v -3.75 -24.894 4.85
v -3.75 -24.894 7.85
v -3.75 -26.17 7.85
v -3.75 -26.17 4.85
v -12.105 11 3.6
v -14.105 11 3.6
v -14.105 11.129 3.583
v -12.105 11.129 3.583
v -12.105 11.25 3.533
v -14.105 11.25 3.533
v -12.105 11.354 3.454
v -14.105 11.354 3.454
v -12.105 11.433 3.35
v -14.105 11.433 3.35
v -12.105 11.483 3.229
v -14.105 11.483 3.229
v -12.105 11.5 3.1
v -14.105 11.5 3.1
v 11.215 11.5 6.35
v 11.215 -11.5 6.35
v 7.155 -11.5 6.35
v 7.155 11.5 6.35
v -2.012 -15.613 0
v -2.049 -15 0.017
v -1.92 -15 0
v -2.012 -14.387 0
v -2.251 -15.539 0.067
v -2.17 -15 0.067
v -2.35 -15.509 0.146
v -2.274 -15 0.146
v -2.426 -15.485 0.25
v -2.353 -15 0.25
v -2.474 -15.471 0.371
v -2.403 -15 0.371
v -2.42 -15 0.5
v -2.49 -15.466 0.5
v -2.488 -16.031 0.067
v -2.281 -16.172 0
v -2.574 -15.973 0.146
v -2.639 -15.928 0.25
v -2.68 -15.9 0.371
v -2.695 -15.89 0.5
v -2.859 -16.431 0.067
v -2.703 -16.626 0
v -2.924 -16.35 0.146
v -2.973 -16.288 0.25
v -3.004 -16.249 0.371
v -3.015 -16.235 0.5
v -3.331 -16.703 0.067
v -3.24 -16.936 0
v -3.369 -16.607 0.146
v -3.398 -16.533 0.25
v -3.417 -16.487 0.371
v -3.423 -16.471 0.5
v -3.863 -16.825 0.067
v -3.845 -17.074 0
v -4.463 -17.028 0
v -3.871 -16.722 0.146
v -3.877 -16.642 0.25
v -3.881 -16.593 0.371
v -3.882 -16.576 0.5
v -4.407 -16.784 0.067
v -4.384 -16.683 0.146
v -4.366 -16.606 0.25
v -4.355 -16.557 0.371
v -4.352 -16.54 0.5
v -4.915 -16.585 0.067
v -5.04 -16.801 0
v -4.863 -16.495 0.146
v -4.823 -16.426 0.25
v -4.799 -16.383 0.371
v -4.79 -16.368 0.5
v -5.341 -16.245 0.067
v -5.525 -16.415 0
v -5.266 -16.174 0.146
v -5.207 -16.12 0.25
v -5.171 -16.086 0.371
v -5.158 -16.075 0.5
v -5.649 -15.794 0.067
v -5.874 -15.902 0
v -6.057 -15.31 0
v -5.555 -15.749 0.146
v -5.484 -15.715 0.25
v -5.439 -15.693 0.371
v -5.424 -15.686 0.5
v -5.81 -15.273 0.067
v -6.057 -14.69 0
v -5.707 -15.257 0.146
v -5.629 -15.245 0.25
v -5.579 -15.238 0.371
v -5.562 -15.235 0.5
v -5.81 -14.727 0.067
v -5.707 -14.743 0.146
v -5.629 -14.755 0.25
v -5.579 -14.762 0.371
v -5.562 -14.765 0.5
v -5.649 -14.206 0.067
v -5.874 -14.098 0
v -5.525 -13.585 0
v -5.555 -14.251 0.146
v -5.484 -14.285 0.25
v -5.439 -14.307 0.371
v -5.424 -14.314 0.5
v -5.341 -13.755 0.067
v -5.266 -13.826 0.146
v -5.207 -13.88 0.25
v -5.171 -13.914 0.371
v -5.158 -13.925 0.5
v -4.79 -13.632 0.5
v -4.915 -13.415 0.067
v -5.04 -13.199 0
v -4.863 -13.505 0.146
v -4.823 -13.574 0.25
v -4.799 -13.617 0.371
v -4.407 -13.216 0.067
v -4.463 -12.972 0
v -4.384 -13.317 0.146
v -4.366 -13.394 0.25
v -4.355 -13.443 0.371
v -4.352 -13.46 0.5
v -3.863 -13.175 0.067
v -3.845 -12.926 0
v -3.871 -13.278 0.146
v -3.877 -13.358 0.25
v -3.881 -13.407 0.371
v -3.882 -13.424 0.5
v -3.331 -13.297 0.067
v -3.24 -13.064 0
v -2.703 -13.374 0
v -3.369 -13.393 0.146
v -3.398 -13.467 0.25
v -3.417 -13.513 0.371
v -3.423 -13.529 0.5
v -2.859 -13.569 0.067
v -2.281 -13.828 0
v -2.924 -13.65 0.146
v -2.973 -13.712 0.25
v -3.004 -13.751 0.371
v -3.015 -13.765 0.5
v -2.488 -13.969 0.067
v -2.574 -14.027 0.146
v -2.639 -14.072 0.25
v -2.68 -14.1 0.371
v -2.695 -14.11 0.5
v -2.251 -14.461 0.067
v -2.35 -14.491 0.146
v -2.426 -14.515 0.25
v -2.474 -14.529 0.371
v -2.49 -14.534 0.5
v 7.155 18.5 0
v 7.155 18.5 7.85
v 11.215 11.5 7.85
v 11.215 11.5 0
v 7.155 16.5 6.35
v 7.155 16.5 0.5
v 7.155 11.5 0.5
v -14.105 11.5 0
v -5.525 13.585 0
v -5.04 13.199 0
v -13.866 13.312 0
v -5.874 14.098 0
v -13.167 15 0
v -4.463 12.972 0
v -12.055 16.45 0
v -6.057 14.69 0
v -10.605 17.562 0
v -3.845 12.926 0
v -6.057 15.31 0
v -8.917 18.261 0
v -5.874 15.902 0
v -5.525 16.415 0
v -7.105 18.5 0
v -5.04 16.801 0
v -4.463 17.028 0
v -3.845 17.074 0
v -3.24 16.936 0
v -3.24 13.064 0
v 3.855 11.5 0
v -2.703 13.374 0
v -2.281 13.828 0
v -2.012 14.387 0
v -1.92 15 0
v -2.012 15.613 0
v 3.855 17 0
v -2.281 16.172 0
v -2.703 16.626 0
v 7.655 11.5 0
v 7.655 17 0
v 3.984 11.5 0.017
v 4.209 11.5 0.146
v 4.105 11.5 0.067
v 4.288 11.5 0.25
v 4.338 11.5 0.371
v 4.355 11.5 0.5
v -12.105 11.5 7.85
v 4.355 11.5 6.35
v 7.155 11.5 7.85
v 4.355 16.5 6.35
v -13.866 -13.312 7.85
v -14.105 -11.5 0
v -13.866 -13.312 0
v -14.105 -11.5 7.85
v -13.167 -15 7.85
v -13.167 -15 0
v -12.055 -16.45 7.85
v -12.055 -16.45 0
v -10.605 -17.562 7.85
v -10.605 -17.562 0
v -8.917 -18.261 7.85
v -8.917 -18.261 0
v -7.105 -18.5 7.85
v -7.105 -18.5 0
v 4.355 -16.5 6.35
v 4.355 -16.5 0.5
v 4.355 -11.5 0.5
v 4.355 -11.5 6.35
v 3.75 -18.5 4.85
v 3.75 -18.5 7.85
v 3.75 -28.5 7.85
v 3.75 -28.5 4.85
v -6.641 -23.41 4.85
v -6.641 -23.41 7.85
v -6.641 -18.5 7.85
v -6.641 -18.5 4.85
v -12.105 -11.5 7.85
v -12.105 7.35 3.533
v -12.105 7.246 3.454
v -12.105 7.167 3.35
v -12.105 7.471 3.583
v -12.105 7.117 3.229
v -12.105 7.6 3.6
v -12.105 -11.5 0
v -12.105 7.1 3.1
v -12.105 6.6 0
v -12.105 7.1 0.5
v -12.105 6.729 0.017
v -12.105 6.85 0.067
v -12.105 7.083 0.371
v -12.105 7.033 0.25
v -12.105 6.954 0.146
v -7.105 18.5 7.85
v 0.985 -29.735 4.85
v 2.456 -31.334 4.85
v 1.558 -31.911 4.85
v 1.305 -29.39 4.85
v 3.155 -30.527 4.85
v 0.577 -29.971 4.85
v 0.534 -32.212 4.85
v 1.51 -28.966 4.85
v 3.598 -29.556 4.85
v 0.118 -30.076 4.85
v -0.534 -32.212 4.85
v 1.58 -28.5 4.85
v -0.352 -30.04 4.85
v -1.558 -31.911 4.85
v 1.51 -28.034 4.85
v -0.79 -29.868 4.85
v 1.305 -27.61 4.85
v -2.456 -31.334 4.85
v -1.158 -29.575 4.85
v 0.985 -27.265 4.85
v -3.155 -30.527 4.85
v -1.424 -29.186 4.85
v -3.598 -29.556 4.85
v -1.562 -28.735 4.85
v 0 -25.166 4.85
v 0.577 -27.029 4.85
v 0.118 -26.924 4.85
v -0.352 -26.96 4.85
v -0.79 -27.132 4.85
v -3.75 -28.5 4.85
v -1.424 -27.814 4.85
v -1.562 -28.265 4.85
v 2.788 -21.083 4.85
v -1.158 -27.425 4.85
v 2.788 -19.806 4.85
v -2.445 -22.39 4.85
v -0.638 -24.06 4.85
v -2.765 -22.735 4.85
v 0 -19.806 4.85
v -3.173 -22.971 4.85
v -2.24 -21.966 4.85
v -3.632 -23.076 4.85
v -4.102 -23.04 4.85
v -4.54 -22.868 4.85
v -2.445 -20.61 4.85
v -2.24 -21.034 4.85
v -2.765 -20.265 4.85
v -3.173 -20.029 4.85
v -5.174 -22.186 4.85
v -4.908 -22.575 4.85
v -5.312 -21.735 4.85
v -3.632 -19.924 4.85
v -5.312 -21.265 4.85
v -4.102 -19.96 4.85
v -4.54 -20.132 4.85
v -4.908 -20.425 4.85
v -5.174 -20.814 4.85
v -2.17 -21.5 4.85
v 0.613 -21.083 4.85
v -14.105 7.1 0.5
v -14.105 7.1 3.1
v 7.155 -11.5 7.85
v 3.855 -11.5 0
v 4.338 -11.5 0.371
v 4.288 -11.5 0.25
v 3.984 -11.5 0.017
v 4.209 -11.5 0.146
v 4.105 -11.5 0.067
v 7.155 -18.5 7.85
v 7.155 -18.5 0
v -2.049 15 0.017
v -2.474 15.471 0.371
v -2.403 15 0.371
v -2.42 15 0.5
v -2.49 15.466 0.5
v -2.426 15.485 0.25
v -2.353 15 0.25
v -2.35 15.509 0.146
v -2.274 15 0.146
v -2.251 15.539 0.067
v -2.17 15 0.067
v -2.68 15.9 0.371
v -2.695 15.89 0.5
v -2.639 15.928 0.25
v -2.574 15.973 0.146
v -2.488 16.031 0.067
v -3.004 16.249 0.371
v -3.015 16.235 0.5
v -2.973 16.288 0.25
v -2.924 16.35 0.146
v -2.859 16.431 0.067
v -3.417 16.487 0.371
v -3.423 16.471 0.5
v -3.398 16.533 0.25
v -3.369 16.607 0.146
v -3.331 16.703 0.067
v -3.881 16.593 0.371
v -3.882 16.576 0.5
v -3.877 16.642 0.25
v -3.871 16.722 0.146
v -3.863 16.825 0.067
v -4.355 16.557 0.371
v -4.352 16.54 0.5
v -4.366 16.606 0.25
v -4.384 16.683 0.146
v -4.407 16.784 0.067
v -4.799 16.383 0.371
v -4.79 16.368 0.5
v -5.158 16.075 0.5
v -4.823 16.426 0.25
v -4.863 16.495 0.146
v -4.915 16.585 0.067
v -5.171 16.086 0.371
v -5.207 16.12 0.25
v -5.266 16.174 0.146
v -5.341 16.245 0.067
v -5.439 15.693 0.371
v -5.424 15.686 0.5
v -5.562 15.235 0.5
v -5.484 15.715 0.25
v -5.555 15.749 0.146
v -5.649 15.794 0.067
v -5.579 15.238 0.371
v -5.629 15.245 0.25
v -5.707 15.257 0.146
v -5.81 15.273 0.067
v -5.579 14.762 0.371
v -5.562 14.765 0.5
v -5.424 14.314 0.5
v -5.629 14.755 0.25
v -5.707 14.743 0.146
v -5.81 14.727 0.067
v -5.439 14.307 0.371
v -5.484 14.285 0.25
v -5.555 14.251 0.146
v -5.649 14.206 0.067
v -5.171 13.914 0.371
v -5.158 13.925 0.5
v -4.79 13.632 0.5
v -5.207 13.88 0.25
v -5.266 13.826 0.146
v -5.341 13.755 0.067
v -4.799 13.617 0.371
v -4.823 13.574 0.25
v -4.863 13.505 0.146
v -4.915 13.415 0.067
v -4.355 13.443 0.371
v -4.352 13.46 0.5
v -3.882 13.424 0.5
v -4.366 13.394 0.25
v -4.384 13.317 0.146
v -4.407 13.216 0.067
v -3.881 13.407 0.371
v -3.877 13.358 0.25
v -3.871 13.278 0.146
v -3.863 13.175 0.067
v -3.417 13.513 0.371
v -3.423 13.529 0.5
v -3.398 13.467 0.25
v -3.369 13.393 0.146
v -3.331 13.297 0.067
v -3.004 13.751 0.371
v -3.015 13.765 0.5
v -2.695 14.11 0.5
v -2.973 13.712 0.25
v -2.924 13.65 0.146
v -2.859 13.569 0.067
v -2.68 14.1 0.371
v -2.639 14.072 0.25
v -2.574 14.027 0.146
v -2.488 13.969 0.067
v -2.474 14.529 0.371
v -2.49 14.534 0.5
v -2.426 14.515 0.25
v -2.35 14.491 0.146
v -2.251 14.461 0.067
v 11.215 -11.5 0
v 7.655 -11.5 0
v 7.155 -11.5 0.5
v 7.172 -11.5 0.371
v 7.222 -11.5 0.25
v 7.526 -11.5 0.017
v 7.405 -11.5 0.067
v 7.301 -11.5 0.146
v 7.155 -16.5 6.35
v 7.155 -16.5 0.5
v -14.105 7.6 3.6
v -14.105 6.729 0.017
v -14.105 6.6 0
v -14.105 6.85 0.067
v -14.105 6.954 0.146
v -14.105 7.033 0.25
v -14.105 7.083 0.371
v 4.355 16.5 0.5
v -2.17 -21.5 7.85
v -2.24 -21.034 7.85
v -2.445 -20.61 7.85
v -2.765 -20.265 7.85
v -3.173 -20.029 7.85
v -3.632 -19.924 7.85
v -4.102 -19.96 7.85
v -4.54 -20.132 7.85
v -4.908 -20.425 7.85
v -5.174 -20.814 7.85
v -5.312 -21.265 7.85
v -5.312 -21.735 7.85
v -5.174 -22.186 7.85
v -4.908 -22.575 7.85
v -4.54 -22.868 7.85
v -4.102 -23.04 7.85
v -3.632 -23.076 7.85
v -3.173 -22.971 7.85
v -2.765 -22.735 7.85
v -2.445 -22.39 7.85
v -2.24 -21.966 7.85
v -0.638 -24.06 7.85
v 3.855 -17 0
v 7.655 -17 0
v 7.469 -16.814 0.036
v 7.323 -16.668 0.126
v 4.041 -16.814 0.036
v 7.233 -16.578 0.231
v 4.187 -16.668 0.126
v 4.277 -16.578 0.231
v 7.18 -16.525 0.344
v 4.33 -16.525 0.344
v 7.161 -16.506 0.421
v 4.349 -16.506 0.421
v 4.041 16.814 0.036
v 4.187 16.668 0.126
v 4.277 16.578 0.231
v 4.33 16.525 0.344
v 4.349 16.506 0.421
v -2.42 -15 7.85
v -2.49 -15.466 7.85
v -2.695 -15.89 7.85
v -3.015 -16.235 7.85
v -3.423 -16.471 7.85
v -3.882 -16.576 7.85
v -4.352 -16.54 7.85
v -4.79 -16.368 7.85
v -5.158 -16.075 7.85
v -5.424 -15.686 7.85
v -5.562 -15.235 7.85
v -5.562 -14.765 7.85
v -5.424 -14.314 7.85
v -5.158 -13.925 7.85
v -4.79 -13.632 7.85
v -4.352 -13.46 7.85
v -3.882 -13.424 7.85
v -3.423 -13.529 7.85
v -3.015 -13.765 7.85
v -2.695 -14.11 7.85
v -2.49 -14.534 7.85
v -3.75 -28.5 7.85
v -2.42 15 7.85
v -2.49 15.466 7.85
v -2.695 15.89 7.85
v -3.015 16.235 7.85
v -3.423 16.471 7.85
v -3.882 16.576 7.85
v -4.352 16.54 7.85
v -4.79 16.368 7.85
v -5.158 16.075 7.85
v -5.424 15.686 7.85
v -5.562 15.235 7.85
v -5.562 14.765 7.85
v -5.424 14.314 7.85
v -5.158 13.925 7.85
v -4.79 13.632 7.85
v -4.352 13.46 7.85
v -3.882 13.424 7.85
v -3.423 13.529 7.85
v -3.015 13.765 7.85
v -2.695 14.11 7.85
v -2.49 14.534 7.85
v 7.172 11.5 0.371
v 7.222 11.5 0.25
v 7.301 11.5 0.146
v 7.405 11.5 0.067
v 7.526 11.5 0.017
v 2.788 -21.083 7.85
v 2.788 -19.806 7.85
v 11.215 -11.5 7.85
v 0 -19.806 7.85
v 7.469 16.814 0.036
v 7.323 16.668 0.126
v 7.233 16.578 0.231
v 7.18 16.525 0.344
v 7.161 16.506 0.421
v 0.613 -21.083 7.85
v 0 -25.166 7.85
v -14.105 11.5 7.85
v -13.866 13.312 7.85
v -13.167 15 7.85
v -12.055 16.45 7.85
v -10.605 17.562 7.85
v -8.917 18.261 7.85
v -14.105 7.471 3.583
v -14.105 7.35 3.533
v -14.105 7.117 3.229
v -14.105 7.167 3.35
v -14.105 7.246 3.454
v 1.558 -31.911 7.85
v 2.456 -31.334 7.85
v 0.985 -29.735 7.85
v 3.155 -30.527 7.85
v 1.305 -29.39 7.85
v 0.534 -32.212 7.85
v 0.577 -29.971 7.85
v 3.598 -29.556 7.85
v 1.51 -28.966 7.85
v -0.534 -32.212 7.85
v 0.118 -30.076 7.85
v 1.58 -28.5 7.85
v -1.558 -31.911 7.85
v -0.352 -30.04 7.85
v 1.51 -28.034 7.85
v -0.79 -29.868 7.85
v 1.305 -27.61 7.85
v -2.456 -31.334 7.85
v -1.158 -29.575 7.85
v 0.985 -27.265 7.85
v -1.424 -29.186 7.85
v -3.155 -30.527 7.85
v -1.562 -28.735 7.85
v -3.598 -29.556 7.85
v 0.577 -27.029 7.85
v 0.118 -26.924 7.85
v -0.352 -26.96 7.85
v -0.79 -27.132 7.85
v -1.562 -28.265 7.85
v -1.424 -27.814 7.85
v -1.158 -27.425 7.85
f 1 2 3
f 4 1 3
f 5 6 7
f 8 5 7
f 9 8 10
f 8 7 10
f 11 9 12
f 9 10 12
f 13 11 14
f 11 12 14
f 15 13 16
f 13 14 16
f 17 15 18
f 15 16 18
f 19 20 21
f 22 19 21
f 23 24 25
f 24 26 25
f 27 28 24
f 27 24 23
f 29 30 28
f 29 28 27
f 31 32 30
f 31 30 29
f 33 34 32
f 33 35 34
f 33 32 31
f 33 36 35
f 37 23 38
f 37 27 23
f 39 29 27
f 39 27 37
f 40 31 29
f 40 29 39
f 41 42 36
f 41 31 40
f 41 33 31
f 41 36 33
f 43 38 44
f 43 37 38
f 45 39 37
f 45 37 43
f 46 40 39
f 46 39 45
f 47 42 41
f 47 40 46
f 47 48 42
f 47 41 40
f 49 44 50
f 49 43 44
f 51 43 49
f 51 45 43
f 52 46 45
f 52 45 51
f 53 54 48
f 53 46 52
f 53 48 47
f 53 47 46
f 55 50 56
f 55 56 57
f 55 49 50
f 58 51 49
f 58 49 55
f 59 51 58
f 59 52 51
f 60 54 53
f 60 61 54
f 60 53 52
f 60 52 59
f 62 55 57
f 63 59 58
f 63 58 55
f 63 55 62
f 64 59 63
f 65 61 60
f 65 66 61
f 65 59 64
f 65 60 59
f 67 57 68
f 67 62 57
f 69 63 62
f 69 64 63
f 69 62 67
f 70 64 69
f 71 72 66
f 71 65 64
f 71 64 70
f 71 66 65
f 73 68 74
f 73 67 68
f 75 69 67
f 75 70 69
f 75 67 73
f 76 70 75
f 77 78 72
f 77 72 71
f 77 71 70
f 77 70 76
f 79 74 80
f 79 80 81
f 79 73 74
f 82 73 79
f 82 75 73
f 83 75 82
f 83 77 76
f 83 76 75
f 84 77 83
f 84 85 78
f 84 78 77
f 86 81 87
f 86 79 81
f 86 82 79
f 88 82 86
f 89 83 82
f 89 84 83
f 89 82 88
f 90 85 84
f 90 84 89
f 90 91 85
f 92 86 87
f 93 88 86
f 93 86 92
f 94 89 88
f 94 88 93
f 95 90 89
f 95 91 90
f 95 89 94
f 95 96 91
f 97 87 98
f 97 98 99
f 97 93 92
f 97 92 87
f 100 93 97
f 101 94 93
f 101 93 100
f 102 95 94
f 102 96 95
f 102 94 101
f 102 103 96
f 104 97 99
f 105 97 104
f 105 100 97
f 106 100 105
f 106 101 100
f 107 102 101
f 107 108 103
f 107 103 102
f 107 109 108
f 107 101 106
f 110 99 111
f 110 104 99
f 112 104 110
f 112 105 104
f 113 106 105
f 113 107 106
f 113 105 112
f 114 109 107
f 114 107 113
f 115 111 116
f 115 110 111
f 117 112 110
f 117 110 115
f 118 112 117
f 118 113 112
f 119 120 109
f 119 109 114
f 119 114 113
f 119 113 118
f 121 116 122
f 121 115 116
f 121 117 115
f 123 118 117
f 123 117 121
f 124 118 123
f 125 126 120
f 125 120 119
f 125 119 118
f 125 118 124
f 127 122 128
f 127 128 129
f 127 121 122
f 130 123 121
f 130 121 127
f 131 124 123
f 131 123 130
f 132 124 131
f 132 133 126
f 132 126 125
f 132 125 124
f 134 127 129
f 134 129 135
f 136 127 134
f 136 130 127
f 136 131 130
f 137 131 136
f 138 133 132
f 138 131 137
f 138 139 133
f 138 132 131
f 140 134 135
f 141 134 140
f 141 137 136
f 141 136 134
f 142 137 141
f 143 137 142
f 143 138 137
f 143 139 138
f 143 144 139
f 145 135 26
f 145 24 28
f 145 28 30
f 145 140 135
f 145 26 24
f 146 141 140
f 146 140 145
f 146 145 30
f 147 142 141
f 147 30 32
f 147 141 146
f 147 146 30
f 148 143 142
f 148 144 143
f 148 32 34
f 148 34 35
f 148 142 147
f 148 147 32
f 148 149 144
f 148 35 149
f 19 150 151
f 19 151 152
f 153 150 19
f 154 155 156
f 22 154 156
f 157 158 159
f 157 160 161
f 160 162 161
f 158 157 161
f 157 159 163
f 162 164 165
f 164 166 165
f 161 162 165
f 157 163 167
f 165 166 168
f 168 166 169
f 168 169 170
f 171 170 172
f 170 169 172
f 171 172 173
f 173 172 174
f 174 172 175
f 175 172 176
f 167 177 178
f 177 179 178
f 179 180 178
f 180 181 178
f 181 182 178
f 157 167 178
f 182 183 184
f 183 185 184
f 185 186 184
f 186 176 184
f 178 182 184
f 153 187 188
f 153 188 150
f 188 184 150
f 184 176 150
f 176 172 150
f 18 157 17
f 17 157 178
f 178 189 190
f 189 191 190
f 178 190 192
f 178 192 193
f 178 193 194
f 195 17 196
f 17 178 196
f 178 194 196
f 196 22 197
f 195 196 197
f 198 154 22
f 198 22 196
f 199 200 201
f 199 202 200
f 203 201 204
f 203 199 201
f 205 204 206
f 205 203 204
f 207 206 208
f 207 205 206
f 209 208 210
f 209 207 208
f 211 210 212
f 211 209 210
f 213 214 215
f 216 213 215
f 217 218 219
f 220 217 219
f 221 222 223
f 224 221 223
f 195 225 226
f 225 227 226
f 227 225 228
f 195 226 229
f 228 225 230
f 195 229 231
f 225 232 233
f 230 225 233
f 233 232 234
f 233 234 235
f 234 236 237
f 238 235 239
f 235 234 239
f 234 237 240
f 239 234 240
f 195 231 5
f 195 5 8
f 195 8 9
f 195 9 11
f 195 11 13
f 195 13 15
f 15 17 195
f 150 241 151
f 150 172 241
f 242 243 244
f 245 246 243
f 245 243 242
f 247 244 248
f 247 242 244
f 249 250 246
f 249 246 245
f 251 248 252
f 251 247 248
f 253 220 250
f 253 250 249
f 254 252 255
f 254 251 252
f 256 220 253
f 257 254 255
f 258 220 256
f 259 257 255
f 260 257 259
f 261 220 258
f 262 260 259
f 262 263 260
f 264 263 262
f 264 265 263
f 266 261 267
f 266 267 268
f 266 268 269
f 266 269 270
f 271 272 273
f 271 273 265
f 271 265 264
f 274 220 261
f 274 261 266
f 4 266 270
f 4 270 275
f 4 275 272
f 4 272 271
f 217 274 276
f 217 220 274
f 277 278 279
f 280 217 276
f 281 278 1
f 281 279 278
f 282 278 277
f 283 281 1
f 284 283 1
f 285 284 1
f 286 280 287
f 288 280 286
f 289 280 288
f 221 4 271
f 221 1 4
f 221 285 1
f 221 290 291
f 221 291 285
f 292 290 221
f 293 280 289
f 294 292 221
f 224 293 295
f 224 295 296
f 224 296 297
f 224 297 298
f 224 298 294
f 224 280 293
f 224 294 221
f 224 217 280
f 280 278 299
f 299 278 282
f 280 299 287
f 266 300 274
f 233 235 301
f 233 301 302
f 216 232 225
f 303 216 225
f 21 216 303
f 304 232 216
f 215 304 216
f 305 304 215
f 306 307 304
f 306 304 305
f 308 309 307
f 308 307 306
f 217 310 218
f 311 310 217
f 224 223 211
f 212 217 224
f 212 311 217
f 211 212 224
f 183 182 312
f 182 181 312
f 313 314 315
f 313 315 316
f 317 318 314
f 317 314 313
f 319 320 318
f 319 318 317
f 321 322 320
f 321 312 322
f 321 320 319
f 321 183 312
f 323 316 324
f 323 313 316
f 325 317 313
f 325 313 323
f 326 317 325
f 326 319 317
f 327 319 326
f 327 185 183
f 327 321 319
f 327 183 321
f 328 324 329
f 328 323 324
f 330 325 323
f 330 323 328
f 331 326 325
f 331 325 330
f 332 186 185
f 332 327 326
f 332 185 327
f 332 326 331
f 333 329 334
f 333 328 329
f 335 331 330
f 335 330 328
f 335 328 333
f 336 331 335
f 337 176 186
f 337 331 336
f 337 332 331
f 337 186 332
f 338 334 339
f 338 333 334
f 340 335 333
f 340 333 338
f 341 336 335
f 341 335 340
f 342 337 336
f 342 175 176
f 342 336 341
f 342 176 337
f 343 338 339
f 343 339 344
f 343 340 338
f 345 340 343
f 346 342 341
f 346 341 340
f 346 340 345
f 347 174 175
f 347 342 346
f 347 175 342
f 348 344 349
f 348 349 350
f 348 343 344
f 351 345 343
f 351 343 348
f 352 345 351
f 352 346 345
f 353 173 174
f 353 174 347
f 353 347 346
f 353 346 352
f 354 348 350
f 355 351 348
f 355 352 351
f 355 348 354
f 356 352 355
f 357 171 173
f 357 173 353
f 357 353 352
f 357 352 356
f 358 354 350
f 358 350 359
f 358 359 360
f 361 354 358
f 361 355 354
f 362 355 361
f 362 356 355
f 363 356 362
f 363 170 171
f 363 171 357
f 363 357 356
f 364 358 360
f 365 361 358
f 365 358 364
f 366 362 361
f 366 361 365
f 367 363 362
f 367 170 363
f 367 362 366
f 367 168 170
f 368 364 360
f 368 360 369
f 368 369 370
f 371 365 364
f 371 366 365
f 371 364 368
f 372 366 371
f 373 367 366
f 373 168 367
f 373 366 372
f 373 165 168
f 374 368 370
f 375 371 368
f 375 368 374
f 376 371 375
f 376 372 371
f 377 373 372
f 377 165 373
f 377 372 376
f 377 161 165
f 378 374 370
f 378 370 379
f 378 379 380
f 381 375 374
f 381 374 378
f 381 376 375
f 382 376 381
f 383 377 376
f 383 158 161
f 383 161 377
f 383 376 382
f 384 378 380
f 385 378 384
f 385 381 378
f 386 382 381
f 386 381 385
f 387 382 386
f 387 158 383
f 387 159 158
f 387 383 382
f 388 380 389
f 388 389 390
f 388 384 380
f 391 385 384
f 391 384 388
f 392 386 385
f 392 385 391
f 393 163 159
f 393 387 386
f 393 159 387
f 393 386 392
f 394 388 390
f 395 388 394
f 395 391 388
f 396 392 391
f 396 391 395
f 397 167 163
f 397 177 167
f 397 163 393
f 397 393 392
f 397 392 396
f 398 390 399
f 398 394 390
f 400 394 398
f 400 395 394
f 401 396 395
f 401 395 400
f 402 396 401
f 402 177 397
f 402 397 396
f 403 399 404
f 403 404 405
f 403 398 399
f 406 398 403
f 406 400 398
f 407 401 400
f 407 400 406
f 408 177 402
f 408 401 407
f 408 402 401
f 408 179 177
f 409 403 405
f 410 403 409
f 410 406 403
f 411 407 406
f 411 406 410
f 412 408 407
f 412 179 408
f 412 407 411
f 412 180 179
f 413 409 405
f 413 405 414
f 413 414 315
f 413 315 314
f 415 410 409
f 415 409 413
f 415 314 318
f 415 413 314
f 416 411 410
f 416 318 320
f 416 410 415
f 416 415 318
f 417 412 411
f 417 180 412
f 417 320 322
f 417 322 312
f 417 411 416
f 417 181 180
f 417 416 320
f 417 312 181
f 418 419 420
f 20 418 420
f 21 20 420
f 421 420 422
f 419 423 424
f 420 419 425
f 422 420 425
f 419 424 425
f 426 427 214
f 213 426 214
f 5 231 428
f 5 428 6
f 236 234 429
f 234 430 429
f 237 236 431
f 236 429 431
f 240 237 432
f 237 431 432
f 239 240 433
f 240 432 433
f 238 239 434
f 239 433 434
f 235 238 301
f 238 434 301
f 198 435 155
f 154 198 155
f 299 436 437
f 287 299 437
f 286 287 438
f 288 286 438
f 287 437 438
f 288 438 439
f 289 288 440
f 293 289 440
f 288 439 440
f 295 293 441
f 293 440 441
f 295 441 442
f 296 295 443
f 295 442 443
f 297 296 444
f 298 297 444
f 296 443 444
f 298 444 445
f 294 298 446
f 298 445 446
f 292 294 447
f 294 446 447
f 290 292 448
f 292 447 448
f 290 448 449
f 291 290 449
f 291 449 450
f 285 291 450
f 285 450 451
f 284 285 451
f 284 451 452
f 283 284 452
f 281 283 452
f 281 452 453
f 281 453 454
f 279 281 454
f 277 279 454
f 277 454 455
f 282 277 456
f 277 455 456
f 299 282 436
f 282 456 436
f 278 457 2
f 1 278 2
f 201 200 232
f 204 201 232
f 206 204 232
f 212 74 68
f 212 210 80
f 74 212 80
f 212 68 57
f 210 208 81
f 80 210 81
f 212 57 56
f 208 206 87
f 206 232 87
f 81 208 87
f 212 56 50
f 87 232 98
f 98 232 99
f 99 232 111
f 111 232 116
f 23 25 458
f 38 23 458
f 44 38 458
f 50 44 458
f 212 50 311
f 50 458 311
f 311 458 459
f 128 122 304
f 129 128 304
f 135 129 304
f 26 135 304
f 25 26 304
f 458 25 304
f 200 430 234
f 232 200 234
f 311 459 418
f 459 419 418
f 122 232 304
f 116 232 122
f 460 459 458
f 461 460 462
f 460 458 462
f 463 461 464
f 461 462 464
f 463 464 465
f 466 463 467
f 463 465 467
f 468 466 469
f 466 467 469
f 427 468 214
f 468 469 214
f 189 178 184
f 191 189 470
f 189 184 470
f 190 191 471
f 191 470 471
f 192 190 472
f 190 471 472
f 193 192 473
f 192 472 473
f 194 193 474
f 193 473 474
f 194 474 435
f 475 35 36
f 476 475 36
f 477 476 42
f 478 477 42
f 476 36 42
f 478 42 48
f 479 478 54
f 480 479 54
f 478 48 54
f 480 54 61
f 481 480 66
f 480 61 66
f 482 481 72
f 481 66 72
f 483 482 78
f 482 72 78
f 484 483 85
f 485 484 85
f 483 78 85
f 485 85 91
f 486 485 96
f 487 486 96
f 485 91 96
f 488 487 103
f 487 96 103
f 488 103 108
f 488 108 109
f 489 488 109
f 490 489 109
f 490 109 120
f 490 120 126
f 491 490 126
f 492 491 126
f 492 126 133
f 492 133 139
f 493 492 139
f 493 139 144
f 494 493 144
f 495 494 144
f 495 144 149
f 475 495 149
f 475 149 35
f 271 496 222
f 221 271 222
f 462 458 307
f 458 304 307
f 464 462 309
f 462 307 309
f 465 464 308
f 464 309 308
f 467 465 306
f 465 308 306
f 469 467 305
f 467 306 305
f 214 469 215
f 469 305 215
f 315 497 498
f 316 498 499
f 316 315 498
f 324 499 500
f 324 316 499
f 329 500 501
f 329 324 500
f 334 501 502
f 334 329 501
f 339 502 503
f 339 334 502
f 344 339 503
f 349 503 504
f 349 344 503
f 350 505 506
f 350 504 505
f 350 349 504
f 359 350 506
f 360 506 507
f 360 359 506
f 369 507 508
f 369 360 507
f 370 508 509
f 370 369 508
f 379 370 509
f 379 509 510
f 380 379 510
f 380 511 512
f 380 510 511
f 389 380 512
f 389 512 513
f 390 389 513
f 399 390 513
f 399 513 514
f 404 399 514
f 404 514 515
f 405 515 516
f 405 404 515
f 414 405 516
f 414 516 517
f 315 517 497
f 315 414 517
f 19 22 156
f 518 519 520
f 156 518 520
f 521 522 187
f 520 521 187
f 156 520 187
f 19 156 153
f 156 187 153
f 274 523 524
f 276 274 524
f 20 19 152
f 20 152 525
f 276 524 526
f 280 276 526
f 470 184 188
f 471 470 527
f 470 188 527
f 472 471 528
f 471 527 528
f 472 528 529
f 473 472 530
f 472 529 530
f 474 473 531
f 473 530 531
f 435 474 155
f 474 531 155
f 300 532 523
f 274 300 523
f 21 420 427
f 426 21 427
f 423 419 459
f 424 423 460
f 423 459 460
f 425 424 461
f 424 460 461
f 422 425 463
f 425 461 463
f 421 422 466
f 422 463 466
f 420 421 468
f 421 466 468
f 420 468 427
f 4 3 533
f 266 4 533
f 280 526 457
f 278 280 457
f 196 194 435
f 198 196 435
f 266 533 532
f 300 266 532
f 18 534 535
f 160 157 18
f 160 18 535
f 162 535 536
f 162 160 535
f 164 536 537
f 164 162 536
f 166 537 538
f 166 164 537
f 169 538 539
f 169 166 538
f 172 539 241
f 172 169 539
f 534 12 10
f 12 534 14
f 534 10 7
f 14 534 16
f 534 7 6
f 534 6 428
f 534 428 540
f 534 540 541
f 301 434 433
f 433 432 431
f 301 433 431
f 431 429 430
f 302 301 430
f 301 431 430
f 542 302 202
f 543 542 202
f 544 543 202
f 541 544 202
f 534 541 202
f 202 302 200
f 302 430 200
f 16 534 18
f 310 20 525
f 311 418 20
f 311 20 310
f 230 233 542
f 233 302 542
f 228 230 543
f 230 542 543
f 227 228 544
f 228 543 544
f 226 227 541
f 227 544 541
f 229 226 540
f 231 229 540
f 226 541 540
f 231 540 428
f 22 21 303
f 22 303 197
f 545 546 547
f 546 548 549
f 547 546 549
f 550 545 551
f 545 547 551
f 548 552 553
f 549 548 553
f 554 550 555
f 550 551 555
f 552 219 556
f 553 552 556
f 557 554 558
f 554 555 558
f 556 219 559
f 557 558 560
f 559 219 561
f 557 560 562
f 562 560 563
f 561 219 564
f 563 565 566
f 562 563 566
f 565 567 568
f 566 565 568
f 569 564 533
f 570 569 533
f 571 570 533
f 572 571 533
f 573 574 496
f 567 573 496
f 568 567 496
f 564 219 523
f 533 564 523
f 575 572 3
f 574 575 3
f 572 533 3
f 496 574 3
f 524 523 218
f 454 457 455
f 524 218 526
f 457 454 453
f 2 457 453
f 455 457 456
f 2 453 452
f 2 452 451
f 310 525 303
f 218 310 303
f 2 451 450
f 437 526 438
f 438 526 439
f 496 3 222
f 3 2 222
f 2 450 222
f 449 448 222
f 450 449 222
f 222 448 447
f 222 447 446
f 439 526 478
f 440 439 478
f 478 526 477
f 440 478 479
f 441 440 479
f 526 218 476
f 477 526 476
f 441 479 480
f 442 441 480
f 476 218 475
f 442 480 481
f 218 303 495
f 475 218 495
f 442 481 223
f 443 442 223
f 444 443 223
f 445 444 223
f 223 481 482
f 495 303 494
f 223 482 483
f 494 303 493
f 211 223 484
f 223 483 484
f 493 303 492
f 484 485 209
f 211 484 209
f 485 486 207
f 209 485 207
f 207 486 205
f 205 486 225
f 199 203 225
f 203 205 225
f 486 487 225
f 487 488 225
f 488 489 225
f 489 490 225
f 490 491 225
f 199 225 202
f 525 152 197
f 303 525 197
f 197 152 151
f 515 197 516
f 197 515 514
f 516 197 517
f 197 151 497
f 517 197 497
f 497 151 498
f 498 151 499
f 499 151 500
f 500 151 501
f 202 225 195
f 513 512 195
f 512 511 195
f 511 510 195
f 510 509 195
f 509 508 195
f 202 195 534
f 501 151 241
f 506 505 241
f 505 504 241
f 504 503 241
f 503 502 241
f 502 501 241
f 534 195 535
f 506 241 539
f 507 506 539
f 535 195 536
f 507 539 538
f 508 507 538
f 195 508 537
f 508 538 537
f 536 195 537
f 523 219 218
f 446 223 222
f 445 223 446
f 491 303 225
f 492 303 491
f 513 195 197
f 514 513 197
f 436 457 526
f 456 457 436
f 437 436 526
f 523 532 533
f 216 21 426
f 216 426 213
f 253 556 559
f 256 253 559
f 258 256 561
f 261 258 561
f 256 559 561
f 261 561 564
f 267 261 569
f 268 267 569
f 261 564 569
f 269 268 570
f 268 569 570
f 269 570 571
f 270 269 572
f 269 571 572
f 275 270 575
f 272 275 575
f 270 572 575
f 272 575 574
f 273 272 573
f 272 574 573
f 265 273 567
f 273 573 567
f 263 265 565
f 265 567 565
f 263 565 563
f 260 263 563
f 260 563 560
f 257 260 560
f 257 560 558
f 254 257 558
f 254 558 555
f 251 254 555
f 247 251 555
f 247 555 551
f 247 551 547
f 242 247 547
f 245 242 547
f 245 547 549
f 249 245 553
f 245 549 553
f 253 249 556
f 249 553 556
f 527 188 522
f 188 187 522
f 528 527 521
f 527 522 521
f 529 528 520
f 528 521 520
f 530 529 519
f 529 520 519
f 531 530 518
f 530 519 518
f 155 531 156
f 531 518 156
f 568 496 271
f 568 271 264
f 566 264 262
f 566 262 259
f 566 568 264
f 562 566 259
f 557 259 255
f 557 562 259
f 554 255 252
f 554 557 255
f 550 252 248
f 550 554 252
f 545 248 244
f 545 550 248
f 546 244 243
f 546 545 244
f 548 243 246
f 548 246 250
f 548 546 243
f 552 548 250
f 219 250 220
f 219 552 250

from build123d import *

# Parameters (mm, degrees)
PAD_DEPTH       = 6.35
SKETCH001_W     = 19.26
SKETCH001_H     = 23
PAD001_DEPTH    = 1.5
SKETCH003_R     = 1.58
POCKET_DEPTH    = 98.88341
SKETCH002_W     = 4.4
SKETCH002_H     = 3.6
POCKET001_DEPTH = 14.106
FILLET_R        = 7
FILLET001_R     = 0.5
SKETCH004_R     = 1.58
PAD002_DEPTH    = 3


with BuildPart() as part:
    # Sketch → Pad (new body)
    with BuildSketch(Plane.XY):
        Polygon((4.355, -11.5), (-12.105, -11.5), (-12.105, 11.5), (4.355, 11.5), (4.355, 16.5), (7.155, 16.5), (7.155, 11.5), (11.215, 11.5), (7.155, 18.5), (-14.105, 18.5), (-14.105, -18.5), (7.155, -18.5), (11.215, -11.5), (7.155, -11.5), (7.155, -16.5), (4.355, -16.5), align=None)
    extrude(amount=PAD_DEPTH)

    # Sketch001 → Pad001 (join)
    with BuildSketch(Plane.XY.offset(6.35)):
        Polygon((-14.105, 0), (-14.105, 18.5), (7.155, 18.5), (11.215, 11.5), (11.215, -11.5), (7.155, -18.5), (-14.105, -18.5), align=None)
        with Locations((-2.475, 0)):
            Rectangle(SKETCH001_W, SKETCH001_H, mode=Mode.SUBTRACT)
    extrude(amount=PAD001_DEPTH)

    # Sketch003 → Pocket (cut, through all)
    with BuildSketch(Plane.XY):
        with Locations((-4, 15)):
            Circle(SKETCH003_R)
    pocket = extrude(amount=POCKET_DEPTH, mode=Mode.SUBTRACT)

    # Mirrored: Pocket across Sketch003 H_Axis
    add(pocket.mirror(Plane.ZX), mode=Mode.SUBTRACT)

    # Sketch002 → Pocket001 (cut, through all)
    with BuildSketch(Plane.YZ):
        with Locations((9.3, 1.8)):
            Rectangle(SKETCH002_W, SKETCH002_H)
    extrude(amount=-POCKET001_DEPTH, mode=Mode.SUBTRACT)

    # Fillet
    fillet_edges = [part.edges().sort_by_distance(p)[0] for p in [
        (-14.105, -18.5, 3.175),
        (-14.105, 18.5, 3.175),
    ]]
    fillet(fillet_edges, radius=FILLET_R)

    # Fillet001
    fillet001_edges = [part.edges().sort_by_distance(p)[0] for p in [
        (-13.105, 7.1, 0),
        (-13.105, 7.1, 3.6),
        (-13.105, 11.5, 3.6),
        (7.155, 14, 0),
        (5.755, 16.5, 0),
        (4.355, 14, 0),
        (7.155, -14, 0),
        (5.755, -16.5, 0),
        (4.355, -14, 0),
        (-5.58, -15, 0),
        (-5.58, 15, 0),
    ]]
    fillet(fillet001_edges, radius=FILLET001_R)

    # Sketch004 → Pad002 (join)
    with BuildSketch(Plane.XY.offset(7.85)):
        with BuildLine():
            Line((-6.6411, -18.5), (3.75, -18.5))
            Line((3.75, -18.5), (3.75, -28.5))
            ThreePointArc((-3.75, -28.5), (0, -32.25), (3.75, -28.5))
            Line((-3.75, -28.5), (-6.6411, -23.41))
            Line((-6.6411, -23.41), (-6.6411, -18.5))
        make_face()
        with Locations((0, -28.5)):
            Circle(SKETCH004_R, mode=Mode.SUBTRACT)
        with Locations((-3.75, -21.5)):
            Circle(SKETCH004_R, mode=Mode.SUBTRACT)
        Polygon((2.788238, -19.805846), (0, -19.805846), (-0.638352, -24.059963), (-3.75, -24.893727), (-3.75, -26.170431), (0, -25.165621), (0.612686, -21.08255), (2.788238, -21.08255), align=None, mode=Mode.SUBTRACT)
    extrude(amount=-PAD002_DEPTH)


solid = part.part
